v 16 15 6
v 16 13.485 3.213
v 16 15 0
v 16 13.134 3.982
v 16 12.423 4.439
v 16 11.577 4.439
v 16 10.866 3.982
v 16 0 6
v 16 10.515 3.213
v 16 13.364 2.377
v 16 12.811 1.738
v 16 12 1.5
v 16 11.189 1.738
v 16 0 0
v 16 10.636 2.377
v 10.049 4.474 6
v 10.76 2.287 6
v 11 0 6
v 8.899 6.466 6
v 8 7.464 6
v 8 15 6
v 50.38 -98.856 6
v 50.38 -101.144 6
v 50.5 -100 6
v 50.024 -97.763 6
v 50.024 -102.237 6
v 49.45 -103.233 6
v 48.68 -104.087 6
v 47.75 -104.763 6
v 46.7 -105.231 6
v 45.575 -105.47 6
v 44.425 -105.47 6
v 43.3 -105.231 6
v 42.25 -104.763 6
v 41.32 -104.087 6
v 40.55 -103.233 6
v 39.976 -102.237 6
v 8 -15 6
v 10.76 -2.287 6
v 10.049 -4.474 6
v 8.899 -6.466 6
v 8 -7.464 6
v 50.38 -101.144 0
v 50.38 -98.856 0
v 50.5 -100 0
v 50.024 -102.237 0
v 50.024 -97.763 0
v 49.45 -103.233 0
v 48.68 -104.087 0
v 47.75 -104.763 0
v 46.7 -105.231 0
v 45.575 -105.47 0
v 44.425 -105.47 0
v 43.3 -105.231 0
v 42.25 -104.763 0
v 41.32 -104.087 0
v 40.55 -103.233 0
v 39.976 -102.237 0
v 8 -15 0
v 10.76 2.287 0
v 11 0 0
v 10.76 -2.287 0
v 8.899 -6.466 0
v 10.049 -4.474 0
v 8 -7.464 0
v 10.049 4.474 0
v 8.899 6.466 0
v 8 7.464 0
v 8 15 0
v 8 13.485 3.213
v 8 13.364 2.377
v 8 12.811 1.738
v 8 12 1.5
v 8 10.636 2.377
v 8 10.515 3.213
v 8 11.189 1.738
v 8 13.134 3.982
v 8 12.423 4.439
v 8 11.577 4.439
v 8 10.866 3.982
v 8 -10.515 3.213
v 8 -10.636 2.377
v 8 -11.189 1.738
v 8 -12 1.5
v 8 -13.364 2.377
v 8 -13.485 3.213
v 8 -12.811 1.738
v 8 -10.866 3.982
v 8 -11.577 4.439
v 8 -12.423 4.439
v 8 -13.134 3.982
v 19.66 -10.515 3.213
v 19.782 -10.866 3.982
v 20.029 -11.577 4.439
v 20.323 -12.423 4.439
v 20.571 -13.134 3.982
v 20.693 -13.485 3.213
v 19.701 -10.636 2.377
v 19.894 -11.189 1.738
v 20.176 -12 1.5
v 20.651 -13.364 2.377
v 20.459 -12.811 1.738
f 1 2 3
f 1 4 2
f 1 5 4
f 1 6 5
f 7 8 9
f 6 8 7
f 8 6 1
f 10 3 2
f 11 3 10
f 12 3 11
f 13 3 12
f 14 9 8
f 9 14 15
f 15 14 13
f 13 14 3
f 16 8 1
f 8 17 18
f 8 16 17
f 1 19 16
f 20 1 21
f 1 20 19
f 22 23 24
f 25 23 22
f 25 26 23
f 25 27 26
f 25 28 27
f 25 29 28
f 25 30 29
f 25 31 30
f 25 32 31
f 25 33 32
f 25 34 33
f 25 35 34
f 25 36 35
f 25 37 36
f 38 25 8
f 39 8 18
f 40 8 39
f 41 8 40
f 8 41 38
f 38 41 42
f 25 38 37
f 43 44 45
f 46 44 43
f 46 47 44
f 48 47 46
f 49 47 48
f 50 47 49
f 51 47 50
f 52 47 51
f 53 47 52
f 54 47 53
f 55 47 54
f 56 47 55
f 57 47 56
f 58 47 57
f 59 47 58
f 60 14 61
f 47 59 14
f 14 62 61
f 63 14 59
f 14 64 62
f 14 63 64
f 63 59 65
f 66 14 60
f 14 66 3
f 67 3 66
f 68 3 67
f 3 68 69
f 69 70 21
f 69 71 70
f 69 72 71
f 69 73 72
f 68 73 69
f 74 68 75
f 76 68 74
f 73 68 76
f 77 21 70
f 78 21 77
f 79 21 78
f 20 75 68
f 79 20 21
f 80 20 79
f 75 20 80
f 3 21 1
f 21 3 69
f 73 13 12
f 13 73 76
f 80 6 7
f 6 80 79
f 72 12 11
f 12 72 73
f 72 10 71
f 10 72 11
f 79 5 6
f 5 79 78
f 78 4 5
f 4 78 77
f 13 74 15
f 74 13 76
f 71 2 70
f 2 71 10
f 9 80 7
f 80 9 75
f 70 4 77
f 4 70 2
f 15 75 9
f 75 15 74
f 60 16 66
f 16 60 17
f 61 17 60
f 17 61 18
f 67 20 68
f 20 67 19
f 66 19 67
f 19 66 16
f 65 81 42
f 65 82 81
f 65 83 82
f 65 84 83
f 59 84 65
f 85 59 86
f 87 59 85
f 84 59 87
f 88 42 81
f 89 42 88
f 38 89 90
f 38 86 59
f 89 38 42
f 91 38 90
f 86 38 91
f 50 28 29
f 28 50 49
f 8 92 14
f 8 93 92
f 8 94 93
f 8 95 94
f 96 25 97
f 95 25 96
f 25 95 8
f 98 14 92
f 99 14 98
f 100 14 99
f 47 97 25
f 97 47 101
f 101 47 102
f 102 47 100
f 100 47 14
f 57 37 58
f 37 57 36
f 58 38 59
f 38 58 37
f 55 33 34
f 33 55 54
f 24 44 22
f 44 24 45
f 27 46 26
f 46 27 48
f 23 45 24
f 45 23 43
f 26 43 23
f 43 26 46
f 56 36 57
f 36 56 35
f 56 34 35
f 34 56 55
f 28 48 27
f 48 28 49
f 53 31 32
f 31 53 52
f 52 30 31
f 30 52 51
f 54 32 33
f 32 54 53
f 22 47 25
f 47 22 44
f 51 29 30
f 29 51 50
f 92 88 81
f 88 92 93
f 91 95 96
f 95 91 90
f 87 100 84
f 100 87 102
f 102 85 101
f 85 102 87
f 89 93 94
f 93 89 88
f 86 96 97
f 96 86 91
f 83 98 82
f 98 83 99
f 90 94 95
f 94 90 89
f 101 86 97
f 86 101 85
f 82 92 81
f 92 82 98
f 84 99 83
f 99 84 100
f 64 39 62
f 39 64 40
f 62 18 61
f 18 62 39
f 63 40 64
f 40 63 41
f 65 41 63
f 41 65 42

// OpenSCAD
h=18;
x= 60;
wall = 4;
$fs=1;
module f8x16() {
    y = 160;
    difference() {
        translate([-x/2,0,0]) cube([x,y,18]);
        translate([-x/2+wall,+wall,-1]) cube([x-wall*2,y-wall*2,18+2]);
        screw_cut_y(y);
        screw_cut_x(x);
    }
}
module f8x(y) {
    
    difference() {
        translate([-x/2,0,0]) cube([x,y,18]);
        translate([-x/2+wall,+wall,-1]) cube([x-wall*2,y-wall*2,18+2]);
        screw_cut_y(y);
        screw_cut_x(x);
    }
}
module screw_cut_x(width) {
    
    dist = 10;
    width = width - dist;
    hole_d = 3.5;
    
    for (a =[dist:dist:width]) {
        translate([-x/2+a,-100,h/2]) rotate([0,90,90]) cylinder(d=hole_d, h=400);
    }
}
module screw_cut_y(length) {
    
    dist = 10;
    length = length - dist;
    hole_d = 3.5;
    
    for (a =[dist:dist:length]) {
        translate([-x,a,h/2]) rotate([0,90,0]) cylinder(d=hole_d, h=x*2);
    }
}
module servo_frame() {
    screw_d = 2.9;
    difference() {
        union() {
            translate([-x/2,-5,-1]) cube([x, 10,1]);
            translate([-x/2+wall,-8/2,0]) cube([x-wall*2-0.5, 8,h/2+1.5+1]);
        }
        for (a =[0:5:x-wall*2-10]) {
        translate([a-x/2+wall+5,0,-2]) cylinder(d=screw_d, h=20+2);
        }
        translate([20,0,h/2]) rotate([0,90,0]) cylinder(d=screw_d, h=x*2);
        translate([-20,0,h/2]) rotate([0,90,180]) cylinder(d=screw_d, h=x*2);
    }
    
    
    //translate([0,0,0]) cylinder(d=3, h=20);
    //translate([0,48.5,0]) cylinder(d=3, h=20);
}
module mount2() {
    $fs= 0.9;
    x = 8;
    y= 15;
    z = 6;
    $fs= 0.9;
    difference() {
        union() {
            translate([8, 0, 0]) cube([x,y,z]);
            hull() {
                
            }
        }
        translate([0,y-3,z/2]) rotate([0,90,0]) cylinder(d=3,h=z*4);
        translate([0,0,-1]) cylinder(d=22,h=z+2);
    }
}
module hollow_cyl(d, w, h) {
    $fs= 0.9;
    difference() {
        cylinder(d=d+w*2, h=h);
        translate([0,0,-1])cylinder(d=d, h=h+2);
    }
}
module link1() {
    $fs= 0.9;
    x = 8;
    y= 15;
    z = 6;
    difference() {
        union() {
            mount2();
            mirror([0,1,0]) mount2();
            hull() {
                mirror([0,1,0]) mount2();
                translate([45,-100,0])hollow_cyl( d=3, w=4, h=6);
            }
        }
        translate([0,y-3,z/2]) rotate([0,90,0]) cylinder(d=3,h=z*4);
        mirror([0,1,0]) translate([0,y-3,z/2]) rotate([0,90,0]) cylinder(d=3,h=z*4);
        translate([0,0,-1]) cylinder(d=22,h=z+2);
    }
    
}
link1();
//f8x16();
//translate([0,10,0])servo_frame();
//translate([90,0,0])f8x(80);
//translate([90,80,0])f8x(80);

//translate([90,-10 -40,0])f8x(40);
